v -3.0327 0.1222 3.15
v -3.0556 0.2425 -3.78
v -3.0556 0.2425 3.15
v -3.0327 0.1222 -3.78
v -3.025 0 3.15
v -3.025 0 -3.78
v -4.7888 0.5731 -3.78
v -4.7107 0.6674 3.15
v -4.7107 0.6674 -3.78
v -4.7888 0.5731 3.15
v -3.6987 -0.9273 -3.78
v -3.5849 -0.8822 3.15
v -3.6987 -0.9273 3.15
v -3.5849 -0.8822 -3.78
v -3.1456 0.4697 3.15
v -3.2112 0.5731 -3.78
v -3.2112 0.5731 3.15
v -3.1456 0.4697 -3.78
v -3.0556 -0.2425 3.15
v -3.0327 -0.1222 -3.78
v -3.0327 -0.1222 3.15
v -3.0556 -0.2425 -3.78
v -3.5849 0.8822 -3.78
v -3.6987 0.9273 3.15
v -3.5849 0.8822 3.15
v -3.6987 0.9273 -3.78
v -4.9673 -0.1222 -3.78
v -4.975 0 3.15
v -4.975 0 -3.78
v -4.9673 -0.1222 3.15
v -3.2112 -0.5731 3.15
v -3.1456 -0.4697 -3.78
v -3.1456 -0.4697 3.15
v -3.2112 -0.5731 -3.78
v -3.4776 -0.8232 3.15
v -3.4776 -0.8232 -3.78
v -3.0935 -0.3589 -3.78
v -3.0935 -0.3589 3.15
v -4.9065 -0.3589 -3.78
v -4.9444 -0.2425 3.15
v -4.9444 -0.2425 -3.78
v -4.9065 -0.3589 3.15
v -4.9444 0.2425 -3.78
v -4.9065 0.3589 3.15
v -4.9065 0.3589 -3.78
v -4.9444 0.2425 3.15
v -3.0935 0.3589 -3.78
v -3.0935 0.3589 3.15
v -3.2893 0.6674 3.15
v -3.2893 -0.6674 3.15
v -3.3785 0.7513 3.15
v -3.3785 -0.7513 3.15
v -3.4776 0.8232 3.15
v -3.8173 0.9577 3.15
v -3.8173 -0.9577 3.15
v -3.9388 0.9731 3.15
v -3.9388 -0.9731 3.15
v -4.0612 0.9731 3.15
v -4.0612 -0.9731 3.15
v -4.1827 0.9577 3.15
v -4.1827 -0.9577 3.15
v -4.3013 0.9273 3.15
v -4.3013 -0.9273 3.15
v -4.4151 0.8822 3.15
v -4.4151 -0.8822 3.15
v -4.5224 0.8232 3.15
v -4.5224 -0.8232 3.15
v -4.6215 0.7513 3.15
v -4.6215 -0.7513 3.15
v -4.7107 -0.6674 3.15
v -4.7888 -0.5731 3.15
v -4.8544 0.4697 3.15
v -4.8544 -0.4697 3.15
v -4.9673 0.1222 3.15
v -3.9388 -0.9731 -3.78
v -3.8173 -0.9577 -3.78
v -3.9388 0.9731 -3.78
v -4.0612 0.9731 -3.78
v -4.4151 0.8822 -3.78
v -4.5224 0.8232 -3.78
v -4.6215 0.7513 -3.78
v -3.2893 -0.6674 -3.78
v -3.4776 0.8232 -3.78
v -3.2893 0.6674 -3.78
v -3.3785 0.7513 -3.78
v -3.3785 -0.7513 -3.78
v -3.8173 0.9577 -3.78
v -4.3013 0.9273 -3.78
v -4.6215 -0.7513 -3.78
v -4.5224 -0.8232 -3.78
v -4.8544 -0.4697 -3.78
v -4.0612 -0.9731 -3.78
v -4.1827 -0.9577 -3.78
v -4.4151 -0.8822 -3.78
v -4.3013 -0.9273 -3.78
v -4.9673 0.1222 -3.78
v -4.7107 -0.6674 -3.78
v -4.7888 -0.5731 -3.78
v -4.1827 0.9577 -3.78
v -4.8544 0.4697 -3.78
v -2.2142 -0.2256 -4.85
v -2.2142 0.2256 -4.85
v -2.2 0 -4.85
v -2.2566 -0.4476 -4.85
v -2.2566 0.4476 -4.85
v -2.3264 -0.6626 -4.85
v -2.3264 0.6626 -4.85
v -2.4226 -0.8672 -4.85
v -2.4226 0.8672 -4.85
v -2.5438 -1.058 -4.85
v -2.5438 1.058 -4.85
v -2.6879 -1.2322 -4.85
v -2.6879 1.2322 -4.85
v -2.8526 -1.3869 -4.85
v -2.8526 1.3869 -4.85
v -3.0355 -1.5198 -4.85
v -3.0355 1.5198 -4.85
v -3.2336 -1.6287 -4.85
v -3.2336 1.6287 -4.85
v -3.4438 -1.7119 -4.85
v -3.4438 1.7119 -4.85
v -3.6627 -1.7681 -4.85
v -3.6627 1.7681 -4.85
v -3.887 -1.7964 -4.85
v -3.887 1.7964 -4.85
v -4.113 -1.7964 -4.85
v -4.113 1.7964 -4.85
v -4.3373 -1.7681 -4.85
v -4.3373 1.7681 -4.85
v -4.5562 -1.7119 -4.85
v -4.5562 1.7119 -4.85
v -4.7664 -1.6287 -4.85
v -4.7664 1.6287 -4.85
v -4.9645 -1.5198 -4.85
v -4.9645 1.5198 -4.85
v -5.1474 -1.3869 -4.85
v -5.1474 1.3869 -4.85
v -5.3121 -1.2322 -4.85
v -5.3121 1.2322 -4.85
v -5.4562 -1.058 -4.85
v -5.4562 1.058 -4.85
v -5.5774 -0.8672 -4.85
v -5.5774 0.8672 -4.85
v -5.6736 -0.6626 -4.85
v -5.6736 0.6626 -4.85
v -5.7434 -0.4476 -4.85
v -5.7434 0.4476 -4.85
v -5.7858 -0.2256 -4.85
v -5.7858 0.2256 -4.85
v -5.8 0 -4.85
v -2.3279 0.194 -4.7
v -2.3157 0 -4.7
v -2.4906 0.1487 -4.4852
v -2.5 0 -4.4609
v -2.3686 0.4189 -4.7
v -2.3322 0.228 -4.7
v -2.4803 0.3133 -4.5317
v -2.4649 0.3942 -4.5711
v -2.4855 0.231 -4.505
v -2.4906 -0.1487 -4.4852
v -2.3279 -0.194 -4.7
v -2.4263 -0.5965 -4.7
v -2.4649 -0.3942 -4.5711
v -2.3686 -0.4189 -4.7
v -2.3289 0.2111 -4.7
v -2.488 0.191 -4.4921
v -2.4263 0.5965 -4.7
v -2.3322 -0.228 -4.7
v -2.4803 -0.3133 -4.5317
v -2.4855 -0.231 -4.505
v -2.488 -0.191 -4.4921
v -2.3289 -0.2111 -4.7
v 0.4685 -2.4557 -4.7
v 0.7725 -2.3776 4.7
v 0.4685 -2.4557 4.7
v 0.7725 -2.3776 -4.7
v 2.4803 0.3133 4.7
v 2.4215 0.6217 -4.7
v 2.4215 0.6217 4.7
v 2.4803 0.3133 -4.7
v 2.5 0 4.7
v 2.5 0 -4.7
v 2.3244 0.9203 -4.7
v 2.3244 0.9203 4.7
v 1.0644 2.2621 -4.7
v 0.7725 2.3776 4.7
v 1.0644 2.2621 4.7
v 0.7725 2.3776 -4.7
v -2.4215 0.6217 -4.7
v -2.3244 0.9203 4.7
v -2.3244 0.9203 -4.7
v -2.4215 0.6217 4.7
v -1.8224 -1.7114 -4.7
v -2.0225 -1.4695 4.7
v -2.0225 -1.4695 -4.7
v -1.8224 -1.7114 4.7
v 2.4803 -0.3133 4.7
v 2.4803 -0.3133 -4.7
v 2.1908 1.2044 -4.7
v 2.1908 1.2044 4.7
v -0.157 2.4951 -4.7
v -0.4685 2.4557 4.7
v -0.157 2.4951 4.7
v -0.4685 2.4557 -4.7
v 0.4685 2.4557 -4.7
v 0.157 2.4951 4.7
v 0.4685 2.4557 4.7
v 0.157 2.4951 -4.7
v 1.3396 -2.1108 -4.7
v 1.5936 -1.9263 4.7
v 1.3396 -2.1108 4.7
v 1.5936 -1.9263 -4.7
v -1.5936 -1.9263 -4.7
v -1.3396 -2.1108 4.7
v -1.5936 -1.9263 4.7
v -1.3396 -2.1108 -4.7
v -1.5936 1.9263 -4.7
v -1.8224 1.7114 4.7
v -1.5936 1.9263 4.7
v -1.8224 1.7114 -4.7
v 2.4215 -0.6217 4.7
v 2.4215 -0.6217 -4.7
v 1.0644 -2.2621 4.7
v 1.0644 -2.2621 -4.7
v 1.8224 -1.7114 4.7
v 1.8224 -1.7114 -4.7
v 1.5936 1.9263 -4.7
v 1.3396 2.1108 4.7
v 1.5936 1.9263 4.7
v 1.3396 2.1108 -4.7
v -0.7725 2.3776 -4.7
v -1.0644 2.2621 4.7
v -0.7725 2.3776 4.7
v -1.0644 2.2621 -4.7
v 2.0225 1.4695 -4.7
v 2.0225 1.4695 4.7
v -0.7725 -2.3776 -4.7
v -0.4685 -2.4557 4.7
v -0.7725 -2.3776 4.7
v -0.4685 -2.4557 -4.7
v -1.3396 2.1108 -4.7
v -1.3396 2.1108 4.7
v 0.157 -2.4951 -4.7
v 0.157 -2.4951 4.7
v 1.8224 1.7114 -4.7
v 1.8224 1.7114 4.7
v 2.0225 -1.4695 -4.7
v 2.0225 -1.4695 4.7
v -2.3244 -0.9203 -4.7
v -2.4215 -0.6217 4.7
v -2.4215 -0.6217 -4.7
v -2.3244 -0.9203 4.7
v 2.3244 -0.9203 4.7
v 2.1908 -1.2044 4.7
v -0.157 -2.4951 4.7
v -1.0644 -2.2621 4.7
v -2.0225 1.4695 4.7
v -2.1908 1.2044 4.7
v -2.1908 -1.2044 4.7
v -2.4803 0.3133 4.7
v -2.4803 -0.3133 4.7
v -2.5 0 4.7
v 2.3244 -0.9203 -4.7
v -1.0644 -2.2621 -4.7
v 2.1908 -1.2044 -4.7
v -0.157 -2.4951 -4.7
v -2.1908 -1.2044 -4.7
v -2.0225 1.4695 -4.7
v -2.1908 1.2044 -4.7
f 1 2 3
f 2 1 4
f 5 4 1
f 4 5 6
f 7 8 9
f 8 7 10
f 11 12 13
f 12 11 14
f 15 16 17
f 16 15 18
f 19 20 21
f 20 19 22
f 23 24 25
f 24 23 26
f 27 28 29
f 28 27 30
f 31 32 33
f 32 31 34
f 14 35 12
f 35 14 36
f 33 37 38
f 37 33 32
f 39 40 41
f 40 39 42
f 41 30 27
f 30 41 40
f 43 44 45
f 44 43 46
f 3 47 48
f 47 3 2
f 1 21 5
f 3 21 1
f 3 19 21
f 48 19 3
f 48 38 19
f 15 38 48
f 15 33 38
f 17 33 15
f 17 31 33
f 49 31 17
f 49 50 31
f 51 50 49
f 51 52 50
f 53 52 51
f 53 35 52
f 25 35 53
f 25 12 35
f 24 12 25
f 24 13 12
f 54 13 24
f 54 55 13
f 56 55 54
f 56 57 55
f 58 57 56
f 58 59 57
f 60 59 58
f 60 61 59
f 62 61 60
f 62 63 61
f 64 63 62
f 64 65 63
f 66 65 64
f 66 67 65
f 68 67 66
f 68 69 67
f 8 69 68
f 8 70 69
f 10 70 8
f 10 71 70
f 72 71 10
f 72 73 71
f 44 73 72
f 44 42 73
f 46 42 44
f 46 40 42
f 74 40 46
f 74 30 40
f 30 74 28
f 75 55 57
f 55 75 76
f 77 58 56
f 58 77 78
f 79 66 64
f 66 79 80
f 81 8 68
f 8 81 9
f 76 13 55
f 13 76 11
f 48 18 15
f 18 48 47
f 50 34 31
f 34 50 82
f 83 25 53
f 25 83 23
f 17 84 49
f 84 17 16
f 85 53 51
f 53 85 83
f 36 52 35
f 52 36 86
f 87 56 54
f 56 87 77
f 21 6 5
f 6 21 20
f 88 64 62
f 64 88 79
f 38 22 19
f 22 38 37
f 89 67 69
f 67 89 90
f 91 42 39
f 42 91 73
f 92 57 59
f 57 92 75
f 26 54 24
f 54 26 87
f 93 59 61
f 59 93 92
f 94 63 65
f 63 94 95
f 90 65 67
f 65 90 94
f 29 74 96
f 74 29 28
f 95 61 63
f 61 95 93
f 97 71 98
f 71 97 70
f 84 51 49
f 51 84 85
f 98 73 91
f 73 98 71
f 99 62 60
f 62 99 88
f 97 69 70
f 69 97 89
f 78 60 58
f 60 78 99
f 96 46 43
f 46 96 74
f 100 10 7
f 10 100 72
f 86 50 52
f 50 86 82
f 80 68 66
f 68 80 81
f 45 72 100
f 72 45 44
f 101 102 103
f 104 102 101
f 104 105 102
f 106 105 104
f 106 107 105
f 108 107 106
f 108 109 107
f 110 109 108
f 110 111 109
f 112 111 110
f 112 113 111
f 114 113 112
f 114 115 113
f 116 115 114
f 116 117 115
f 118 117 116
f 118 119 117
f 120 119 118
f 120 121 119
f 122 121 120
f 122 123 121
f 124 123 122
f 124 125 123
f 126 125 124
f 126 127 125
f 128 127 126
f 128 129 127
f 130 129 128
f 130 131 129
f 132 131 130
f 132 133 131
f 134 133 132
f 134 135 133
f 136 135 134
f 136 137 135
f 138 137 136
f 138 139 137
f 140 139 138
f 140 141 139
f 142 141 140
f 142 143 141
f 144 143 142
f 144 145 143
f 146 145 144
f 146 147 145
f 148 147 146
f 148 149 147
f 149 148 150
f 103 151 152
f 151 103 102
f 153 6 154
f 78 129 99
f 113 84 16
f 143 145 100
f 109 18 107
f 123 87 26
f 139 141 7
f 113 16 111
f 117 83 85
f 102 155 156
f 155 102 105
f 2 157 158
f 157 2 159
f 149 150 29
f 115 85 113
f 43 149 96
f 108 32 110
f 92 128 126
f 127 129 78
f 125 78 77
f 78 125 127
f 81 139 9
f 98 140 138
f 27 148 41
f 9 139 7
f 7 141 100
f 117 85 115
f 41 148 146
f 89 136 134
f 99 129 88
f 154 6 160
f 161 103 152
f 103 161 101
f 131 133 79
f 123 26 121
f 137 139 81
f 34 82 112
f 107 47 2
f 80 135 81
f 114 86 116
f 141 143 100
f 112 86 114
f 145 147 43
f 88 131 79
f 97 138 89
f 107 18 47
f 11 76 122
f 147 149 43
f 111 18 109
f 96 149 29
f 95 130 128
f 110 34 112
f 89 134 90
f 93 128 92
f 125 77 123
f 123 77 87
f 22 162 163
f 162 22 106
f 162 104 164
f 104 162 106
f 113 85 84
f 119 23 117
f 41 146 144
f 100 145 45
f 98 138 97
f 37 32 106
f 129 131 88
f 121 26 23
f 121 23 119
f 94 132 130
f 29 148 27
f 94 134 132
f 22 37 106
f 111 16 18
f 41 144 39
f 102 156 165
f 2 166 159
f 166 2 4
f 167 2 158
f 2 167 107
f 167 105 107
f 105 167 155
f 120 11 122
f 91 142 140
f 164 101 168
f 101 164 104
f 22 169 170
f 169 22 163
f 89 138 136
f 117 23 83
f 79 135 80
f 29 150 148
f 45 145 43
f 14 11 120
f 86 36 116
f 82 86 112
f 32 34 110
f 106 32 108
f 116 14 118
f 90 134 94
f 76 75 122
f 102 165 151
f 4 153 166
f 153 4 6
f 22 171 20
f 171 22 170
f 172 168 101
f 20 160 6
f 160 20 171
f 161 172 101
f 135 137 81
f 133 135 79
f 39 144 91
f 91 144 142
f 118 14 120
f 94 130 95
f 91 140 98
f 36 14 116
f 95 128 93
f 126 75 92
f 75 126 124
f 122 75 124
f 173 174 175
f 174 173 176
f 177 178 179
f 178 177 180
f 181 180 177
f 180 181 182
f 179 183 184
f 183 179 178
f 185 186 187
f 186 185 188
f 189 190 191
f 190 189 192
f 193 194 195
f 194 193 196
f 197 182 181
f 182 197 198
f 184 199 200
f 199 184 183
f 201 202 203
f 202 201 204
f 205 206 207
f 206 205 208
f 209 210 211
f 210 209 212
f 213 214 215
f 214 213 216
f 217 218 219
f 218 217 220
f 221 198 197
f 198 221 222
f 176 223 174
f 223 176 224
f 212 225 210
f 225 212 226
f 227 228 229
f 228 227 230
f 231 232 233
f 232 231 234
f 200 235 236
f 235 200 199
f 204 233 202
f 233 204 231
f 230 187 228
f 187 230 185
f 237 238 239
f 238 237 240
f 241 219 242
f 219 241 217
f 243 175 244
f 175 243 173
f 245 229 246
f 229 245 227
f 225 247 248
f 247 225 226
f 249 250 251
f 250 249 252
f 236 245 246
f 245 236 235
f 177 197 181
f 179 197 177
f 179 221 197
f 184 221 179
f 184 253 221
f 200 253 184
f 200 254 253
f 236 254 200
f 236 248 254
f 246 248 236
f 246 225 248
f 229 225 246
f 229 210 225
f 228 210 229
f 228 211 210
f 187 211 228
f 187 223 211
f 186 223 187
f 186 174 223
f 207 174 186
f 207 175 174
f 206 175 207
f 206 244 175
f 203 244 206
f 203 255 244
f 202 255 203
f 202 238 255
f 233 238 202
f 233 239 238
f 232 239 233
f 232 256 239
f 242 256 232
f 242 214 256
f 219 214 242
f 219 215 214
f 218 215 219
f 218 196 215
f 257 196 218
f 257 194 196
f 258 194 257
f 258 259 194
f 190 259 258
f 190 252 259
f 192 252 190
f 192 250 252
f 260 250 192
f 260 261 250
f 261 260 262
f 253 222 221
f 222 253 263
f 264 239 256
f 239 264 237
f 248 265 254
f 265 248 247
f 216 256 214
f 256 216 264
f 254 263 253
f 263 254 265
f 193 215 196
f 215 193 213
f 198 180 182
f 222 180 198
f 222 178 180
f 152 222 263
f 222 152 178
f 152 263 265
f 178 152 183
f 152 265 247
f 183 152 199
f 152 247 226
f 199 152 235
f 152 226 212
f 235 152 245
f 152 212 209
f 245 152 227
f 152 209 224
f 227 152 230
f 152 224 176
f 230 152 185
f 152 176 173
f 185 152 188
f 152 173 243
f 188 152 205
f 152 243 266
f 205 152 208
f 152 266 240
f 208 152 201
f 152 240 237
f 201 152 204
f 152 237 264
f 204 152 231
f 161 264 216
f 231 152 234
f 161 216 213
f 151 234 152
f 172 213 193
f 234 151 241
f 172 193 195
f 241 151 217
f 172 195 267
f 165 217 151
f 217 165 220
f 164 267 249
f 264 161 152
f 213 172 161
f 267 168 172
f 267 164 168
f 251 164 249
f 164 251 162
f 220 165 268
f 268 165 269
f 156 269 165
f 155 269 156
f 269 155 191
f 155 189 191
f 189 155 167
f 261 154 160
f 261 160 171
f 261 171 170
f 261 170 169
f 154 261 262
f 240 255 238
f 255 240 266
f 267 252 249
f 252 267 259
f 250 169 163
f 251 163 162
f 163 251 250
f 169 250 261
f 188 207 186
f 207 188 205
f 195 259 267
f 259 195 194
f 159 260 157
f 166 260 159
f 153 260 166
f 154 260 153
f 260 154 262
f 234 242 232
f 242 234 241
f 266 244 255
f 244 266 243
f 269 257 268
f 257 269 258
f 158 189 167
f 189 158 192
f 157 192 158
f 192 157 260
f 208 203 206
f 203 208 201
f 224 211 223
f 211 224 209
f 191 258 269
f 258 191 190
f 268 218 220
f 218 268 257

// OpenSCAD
$fn=50;


module screw_m2x8(){

    cylinder(d=1.95, h=8);

    cylinder(d1=3.6, d2=1.95, h=1.07);


}


module solid_insert(){

    cylinder(d=5, h=9.4, center=true);

}

module screw(solid=false){

    if(solid){
        solid_insert();
    } else {
        translate([0,0,-4.85])
        screw_m2x8();
    }

}





screw(solid=true);
translate([-4,0,0])
screw(solid=false);
